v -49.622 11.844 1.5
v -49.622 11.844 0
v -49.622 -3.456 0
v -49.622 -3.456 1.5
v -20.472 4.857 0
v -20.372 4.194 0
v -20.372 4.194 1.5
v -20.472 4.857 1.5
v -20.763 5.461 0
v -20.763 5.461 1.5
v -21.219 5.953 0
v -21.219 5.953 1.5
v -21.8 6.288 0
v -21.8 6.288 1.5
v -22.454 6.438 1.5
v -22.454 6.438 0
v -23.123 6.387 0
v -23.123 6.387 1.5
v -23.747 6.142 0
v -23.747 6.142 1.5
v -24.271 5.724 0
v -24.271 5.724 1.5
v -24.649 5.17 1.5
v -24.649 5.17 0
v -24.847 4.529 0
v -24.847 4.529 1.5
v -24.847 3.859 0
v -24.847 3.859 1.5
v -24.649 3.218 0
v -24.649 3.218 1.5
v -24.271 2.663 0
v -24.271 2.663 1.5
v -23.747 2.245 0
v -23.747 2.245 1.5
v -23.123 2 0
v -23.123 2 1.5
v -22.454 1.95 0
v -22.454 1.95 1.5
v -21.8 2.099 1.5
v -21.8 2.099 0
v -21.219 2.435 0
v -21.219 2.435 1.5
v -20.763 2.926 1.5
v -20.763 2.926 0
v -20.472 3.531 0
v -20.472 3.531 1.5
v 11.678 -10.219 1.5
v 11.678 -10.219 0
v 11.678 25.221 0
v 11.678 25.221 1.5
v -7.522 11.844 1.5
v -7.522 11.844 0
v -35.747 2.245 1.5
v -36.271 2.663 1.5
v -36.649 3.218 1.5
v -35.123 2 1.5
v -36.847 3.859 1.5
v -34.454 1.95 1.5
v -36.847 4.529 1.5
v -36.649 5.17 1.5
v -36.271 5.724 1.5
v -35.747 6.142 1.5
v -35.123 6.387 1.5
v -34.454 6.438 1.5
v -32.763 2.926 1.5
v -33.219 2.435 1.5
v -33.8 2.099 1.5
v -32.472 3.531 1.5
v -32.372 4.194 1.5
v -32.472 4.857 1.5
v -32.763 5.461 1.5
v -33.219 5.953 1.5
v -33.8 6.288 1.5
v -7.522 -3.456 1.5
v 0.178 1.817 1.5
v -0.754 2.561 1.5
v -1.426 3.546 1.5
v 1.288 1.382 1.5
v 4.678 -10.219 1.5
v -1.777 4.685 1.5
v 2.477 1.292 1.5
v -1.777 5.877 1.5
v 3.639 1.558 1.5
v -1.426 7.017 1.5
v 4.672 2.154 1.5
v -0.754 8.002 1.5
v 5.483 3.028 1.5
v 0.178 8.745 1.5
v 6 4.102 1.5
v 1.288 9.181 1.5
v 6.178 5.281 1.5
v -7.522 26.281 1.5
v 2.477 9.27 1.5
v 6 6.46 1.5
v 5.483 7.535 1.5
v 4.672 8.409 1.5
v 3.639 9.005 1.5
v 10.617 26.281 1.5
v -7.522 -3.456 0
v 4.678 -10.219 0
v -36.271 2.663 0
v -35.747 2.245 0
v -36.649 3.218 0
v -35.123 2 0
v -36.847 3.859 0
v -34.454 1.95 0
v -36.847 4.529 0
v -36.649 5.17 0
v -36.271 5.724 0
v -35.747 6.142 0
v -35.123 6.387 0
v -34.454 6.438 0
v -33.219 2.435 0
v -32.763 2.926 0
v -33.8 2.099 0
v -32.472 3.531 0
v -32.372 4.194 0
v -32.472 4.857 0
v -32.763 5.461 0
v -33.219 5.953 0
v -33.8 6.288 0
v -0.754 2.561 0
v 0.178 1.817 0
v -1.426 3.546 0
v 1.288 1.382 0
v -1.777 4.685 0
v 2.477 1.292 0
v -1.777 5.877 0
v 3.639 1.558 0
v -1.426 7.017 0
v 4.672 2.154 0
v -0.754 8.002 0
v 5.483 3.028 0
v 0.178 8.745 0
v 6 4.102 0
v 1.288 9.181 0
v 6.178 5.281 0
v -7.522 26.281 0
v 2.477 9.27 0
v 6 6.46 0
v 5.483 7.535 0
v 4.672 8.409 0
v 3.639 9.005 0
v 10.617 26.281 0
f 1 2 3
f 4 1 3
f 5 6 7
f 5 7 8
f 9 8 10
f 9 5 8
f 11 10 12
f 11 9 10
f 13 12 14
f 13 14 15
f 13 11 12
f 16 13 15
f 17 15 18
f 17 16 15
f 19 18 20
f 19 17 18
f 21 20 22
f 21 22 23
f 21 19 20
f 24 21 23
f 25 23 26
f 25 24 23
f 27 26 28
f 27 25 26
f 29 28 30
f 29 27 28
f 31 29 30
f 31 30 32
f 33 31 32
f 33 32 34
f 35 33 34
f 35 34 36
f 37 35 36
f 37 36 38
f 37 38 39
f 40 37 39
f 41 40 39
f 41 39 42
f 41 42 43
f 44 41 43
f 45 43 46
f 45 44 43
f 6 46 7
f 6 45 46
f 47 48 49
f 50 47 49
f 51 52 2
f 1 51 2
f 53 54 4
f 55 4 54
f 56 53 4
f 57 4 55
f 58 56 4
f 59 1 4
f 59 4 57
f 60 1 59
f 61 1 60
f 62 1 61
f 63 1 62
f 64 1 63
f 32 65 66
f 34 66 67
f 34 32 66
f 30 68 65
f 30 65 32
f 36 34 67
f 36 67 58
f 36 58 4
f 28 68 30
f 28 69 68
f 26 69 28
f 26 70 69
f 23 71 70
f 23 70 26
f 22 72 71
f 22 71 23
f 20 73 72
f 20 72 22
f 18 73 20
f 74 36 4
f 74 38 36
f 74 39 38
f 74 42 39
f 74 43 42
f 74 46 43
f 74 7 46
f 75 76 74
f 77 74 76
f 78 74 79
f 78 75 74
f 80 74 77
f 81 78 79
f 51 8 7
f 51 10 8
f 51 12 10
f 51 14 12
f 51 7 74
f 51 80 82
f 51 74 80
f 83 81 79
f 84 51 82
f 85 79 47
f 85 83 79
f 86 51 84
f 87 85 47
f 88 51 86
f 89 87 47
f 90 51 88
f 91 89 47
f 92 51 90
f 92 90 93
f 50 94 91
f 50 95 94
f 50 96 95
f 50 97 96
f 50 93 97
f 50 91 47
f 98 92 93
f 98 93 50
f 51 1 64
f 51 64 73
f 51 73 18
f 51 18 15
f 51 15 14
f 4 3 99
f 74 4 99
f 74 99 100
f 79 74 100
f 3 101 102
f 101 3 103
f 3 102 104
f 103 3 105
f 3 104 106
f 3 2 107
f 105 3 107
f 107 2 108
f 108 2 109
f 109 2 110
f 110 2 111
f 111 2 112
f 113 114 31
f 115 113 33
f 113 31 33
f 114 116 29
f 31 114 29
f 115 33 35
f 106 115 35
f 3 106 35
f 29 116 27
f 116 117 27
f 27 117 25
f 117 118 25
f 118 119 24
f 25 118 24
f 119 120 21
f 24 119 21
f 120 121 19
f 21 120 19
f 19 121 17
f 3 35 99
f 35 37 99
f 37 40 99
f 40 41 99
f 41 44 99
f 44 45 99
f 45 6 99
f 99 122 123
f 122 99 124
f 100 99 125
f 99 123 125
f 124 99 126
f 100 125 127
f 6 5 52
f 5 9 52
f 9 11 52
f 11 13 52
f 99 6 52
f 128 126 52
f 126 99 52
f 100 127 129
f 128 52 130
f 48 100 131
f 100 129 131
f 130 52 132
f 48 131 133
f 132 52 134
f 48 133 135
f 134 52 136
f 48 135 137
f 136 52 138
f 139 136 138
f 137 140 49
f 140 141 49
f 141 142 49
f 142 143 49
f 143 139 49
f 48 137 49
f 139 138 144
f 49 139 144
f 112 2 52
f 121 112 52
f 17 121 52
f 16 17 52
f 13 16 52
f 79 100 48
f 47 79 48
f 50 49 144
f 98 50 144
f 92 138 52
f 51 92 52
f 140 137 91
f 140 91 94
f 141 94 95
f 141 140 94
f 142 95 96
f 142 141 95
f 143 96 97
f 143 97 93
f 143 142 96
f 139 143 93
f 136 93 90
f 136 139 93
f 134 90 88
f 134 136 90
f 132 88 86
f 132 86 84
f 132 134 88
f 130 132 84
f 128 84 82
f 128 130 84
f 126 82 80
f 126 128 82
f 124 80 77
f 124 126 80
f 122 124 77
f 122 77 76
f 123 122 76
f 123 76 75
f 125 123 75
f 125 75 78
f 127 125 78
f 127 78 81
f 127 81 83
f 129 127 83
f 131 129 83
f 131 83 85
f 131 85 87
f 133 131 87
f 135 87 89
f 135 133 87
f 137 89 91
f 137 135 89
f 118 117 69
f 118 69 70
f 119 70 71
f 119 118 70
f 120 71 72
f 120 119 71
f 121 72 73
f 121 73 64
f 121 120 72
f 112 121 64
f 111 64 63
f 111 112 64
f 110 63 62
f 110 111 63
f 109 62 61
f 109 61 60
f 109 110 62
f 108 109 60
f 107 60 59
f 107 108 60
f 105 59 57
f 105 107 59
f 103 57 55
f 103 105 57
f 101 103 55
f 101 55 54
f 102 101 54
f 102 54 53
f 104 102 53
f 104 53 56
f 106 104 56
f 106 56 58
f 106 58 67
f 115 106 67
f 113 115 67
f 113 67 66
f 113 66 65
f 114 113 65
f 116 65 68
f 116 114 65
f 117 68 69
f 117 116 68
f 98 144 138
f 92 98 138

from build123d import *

# Parameters (mm, degrees)
F0_R     = 2.25
F0_R_2   = 4
F1_DEPTH = 1.5


with BuildPart() as f1:
    # F0 (on Top) → F1 (new body)
    with BuildSketch(Plane.XY):
        Polygon((-7.522005, 11.843878), (-49.622005, 11.843878), (-49.622005, -3.456122), (-7.522005, -3.456122), (4.677995, -10.218692), (11.677995, -10.218692), (11.677995, 25.220647), (10.617335, 26.281308), (-7.522005, 26.281308), align=None)
        with Locations((-34.622005, 4.193878)):
            Circle(F0_R, mode=Mode.SUBTRACT)
        with Locations((-22.622005, 4.193878)):
            Circle(F0_R, mode=Mode.SUBTRACT)
        with Locations((2.177995, 5.281308)):
            Circle(F0_R_2, mode=Mode.SUBTRACT)
    extrude(amount=F1_DEPTH)


solid = f1.part
